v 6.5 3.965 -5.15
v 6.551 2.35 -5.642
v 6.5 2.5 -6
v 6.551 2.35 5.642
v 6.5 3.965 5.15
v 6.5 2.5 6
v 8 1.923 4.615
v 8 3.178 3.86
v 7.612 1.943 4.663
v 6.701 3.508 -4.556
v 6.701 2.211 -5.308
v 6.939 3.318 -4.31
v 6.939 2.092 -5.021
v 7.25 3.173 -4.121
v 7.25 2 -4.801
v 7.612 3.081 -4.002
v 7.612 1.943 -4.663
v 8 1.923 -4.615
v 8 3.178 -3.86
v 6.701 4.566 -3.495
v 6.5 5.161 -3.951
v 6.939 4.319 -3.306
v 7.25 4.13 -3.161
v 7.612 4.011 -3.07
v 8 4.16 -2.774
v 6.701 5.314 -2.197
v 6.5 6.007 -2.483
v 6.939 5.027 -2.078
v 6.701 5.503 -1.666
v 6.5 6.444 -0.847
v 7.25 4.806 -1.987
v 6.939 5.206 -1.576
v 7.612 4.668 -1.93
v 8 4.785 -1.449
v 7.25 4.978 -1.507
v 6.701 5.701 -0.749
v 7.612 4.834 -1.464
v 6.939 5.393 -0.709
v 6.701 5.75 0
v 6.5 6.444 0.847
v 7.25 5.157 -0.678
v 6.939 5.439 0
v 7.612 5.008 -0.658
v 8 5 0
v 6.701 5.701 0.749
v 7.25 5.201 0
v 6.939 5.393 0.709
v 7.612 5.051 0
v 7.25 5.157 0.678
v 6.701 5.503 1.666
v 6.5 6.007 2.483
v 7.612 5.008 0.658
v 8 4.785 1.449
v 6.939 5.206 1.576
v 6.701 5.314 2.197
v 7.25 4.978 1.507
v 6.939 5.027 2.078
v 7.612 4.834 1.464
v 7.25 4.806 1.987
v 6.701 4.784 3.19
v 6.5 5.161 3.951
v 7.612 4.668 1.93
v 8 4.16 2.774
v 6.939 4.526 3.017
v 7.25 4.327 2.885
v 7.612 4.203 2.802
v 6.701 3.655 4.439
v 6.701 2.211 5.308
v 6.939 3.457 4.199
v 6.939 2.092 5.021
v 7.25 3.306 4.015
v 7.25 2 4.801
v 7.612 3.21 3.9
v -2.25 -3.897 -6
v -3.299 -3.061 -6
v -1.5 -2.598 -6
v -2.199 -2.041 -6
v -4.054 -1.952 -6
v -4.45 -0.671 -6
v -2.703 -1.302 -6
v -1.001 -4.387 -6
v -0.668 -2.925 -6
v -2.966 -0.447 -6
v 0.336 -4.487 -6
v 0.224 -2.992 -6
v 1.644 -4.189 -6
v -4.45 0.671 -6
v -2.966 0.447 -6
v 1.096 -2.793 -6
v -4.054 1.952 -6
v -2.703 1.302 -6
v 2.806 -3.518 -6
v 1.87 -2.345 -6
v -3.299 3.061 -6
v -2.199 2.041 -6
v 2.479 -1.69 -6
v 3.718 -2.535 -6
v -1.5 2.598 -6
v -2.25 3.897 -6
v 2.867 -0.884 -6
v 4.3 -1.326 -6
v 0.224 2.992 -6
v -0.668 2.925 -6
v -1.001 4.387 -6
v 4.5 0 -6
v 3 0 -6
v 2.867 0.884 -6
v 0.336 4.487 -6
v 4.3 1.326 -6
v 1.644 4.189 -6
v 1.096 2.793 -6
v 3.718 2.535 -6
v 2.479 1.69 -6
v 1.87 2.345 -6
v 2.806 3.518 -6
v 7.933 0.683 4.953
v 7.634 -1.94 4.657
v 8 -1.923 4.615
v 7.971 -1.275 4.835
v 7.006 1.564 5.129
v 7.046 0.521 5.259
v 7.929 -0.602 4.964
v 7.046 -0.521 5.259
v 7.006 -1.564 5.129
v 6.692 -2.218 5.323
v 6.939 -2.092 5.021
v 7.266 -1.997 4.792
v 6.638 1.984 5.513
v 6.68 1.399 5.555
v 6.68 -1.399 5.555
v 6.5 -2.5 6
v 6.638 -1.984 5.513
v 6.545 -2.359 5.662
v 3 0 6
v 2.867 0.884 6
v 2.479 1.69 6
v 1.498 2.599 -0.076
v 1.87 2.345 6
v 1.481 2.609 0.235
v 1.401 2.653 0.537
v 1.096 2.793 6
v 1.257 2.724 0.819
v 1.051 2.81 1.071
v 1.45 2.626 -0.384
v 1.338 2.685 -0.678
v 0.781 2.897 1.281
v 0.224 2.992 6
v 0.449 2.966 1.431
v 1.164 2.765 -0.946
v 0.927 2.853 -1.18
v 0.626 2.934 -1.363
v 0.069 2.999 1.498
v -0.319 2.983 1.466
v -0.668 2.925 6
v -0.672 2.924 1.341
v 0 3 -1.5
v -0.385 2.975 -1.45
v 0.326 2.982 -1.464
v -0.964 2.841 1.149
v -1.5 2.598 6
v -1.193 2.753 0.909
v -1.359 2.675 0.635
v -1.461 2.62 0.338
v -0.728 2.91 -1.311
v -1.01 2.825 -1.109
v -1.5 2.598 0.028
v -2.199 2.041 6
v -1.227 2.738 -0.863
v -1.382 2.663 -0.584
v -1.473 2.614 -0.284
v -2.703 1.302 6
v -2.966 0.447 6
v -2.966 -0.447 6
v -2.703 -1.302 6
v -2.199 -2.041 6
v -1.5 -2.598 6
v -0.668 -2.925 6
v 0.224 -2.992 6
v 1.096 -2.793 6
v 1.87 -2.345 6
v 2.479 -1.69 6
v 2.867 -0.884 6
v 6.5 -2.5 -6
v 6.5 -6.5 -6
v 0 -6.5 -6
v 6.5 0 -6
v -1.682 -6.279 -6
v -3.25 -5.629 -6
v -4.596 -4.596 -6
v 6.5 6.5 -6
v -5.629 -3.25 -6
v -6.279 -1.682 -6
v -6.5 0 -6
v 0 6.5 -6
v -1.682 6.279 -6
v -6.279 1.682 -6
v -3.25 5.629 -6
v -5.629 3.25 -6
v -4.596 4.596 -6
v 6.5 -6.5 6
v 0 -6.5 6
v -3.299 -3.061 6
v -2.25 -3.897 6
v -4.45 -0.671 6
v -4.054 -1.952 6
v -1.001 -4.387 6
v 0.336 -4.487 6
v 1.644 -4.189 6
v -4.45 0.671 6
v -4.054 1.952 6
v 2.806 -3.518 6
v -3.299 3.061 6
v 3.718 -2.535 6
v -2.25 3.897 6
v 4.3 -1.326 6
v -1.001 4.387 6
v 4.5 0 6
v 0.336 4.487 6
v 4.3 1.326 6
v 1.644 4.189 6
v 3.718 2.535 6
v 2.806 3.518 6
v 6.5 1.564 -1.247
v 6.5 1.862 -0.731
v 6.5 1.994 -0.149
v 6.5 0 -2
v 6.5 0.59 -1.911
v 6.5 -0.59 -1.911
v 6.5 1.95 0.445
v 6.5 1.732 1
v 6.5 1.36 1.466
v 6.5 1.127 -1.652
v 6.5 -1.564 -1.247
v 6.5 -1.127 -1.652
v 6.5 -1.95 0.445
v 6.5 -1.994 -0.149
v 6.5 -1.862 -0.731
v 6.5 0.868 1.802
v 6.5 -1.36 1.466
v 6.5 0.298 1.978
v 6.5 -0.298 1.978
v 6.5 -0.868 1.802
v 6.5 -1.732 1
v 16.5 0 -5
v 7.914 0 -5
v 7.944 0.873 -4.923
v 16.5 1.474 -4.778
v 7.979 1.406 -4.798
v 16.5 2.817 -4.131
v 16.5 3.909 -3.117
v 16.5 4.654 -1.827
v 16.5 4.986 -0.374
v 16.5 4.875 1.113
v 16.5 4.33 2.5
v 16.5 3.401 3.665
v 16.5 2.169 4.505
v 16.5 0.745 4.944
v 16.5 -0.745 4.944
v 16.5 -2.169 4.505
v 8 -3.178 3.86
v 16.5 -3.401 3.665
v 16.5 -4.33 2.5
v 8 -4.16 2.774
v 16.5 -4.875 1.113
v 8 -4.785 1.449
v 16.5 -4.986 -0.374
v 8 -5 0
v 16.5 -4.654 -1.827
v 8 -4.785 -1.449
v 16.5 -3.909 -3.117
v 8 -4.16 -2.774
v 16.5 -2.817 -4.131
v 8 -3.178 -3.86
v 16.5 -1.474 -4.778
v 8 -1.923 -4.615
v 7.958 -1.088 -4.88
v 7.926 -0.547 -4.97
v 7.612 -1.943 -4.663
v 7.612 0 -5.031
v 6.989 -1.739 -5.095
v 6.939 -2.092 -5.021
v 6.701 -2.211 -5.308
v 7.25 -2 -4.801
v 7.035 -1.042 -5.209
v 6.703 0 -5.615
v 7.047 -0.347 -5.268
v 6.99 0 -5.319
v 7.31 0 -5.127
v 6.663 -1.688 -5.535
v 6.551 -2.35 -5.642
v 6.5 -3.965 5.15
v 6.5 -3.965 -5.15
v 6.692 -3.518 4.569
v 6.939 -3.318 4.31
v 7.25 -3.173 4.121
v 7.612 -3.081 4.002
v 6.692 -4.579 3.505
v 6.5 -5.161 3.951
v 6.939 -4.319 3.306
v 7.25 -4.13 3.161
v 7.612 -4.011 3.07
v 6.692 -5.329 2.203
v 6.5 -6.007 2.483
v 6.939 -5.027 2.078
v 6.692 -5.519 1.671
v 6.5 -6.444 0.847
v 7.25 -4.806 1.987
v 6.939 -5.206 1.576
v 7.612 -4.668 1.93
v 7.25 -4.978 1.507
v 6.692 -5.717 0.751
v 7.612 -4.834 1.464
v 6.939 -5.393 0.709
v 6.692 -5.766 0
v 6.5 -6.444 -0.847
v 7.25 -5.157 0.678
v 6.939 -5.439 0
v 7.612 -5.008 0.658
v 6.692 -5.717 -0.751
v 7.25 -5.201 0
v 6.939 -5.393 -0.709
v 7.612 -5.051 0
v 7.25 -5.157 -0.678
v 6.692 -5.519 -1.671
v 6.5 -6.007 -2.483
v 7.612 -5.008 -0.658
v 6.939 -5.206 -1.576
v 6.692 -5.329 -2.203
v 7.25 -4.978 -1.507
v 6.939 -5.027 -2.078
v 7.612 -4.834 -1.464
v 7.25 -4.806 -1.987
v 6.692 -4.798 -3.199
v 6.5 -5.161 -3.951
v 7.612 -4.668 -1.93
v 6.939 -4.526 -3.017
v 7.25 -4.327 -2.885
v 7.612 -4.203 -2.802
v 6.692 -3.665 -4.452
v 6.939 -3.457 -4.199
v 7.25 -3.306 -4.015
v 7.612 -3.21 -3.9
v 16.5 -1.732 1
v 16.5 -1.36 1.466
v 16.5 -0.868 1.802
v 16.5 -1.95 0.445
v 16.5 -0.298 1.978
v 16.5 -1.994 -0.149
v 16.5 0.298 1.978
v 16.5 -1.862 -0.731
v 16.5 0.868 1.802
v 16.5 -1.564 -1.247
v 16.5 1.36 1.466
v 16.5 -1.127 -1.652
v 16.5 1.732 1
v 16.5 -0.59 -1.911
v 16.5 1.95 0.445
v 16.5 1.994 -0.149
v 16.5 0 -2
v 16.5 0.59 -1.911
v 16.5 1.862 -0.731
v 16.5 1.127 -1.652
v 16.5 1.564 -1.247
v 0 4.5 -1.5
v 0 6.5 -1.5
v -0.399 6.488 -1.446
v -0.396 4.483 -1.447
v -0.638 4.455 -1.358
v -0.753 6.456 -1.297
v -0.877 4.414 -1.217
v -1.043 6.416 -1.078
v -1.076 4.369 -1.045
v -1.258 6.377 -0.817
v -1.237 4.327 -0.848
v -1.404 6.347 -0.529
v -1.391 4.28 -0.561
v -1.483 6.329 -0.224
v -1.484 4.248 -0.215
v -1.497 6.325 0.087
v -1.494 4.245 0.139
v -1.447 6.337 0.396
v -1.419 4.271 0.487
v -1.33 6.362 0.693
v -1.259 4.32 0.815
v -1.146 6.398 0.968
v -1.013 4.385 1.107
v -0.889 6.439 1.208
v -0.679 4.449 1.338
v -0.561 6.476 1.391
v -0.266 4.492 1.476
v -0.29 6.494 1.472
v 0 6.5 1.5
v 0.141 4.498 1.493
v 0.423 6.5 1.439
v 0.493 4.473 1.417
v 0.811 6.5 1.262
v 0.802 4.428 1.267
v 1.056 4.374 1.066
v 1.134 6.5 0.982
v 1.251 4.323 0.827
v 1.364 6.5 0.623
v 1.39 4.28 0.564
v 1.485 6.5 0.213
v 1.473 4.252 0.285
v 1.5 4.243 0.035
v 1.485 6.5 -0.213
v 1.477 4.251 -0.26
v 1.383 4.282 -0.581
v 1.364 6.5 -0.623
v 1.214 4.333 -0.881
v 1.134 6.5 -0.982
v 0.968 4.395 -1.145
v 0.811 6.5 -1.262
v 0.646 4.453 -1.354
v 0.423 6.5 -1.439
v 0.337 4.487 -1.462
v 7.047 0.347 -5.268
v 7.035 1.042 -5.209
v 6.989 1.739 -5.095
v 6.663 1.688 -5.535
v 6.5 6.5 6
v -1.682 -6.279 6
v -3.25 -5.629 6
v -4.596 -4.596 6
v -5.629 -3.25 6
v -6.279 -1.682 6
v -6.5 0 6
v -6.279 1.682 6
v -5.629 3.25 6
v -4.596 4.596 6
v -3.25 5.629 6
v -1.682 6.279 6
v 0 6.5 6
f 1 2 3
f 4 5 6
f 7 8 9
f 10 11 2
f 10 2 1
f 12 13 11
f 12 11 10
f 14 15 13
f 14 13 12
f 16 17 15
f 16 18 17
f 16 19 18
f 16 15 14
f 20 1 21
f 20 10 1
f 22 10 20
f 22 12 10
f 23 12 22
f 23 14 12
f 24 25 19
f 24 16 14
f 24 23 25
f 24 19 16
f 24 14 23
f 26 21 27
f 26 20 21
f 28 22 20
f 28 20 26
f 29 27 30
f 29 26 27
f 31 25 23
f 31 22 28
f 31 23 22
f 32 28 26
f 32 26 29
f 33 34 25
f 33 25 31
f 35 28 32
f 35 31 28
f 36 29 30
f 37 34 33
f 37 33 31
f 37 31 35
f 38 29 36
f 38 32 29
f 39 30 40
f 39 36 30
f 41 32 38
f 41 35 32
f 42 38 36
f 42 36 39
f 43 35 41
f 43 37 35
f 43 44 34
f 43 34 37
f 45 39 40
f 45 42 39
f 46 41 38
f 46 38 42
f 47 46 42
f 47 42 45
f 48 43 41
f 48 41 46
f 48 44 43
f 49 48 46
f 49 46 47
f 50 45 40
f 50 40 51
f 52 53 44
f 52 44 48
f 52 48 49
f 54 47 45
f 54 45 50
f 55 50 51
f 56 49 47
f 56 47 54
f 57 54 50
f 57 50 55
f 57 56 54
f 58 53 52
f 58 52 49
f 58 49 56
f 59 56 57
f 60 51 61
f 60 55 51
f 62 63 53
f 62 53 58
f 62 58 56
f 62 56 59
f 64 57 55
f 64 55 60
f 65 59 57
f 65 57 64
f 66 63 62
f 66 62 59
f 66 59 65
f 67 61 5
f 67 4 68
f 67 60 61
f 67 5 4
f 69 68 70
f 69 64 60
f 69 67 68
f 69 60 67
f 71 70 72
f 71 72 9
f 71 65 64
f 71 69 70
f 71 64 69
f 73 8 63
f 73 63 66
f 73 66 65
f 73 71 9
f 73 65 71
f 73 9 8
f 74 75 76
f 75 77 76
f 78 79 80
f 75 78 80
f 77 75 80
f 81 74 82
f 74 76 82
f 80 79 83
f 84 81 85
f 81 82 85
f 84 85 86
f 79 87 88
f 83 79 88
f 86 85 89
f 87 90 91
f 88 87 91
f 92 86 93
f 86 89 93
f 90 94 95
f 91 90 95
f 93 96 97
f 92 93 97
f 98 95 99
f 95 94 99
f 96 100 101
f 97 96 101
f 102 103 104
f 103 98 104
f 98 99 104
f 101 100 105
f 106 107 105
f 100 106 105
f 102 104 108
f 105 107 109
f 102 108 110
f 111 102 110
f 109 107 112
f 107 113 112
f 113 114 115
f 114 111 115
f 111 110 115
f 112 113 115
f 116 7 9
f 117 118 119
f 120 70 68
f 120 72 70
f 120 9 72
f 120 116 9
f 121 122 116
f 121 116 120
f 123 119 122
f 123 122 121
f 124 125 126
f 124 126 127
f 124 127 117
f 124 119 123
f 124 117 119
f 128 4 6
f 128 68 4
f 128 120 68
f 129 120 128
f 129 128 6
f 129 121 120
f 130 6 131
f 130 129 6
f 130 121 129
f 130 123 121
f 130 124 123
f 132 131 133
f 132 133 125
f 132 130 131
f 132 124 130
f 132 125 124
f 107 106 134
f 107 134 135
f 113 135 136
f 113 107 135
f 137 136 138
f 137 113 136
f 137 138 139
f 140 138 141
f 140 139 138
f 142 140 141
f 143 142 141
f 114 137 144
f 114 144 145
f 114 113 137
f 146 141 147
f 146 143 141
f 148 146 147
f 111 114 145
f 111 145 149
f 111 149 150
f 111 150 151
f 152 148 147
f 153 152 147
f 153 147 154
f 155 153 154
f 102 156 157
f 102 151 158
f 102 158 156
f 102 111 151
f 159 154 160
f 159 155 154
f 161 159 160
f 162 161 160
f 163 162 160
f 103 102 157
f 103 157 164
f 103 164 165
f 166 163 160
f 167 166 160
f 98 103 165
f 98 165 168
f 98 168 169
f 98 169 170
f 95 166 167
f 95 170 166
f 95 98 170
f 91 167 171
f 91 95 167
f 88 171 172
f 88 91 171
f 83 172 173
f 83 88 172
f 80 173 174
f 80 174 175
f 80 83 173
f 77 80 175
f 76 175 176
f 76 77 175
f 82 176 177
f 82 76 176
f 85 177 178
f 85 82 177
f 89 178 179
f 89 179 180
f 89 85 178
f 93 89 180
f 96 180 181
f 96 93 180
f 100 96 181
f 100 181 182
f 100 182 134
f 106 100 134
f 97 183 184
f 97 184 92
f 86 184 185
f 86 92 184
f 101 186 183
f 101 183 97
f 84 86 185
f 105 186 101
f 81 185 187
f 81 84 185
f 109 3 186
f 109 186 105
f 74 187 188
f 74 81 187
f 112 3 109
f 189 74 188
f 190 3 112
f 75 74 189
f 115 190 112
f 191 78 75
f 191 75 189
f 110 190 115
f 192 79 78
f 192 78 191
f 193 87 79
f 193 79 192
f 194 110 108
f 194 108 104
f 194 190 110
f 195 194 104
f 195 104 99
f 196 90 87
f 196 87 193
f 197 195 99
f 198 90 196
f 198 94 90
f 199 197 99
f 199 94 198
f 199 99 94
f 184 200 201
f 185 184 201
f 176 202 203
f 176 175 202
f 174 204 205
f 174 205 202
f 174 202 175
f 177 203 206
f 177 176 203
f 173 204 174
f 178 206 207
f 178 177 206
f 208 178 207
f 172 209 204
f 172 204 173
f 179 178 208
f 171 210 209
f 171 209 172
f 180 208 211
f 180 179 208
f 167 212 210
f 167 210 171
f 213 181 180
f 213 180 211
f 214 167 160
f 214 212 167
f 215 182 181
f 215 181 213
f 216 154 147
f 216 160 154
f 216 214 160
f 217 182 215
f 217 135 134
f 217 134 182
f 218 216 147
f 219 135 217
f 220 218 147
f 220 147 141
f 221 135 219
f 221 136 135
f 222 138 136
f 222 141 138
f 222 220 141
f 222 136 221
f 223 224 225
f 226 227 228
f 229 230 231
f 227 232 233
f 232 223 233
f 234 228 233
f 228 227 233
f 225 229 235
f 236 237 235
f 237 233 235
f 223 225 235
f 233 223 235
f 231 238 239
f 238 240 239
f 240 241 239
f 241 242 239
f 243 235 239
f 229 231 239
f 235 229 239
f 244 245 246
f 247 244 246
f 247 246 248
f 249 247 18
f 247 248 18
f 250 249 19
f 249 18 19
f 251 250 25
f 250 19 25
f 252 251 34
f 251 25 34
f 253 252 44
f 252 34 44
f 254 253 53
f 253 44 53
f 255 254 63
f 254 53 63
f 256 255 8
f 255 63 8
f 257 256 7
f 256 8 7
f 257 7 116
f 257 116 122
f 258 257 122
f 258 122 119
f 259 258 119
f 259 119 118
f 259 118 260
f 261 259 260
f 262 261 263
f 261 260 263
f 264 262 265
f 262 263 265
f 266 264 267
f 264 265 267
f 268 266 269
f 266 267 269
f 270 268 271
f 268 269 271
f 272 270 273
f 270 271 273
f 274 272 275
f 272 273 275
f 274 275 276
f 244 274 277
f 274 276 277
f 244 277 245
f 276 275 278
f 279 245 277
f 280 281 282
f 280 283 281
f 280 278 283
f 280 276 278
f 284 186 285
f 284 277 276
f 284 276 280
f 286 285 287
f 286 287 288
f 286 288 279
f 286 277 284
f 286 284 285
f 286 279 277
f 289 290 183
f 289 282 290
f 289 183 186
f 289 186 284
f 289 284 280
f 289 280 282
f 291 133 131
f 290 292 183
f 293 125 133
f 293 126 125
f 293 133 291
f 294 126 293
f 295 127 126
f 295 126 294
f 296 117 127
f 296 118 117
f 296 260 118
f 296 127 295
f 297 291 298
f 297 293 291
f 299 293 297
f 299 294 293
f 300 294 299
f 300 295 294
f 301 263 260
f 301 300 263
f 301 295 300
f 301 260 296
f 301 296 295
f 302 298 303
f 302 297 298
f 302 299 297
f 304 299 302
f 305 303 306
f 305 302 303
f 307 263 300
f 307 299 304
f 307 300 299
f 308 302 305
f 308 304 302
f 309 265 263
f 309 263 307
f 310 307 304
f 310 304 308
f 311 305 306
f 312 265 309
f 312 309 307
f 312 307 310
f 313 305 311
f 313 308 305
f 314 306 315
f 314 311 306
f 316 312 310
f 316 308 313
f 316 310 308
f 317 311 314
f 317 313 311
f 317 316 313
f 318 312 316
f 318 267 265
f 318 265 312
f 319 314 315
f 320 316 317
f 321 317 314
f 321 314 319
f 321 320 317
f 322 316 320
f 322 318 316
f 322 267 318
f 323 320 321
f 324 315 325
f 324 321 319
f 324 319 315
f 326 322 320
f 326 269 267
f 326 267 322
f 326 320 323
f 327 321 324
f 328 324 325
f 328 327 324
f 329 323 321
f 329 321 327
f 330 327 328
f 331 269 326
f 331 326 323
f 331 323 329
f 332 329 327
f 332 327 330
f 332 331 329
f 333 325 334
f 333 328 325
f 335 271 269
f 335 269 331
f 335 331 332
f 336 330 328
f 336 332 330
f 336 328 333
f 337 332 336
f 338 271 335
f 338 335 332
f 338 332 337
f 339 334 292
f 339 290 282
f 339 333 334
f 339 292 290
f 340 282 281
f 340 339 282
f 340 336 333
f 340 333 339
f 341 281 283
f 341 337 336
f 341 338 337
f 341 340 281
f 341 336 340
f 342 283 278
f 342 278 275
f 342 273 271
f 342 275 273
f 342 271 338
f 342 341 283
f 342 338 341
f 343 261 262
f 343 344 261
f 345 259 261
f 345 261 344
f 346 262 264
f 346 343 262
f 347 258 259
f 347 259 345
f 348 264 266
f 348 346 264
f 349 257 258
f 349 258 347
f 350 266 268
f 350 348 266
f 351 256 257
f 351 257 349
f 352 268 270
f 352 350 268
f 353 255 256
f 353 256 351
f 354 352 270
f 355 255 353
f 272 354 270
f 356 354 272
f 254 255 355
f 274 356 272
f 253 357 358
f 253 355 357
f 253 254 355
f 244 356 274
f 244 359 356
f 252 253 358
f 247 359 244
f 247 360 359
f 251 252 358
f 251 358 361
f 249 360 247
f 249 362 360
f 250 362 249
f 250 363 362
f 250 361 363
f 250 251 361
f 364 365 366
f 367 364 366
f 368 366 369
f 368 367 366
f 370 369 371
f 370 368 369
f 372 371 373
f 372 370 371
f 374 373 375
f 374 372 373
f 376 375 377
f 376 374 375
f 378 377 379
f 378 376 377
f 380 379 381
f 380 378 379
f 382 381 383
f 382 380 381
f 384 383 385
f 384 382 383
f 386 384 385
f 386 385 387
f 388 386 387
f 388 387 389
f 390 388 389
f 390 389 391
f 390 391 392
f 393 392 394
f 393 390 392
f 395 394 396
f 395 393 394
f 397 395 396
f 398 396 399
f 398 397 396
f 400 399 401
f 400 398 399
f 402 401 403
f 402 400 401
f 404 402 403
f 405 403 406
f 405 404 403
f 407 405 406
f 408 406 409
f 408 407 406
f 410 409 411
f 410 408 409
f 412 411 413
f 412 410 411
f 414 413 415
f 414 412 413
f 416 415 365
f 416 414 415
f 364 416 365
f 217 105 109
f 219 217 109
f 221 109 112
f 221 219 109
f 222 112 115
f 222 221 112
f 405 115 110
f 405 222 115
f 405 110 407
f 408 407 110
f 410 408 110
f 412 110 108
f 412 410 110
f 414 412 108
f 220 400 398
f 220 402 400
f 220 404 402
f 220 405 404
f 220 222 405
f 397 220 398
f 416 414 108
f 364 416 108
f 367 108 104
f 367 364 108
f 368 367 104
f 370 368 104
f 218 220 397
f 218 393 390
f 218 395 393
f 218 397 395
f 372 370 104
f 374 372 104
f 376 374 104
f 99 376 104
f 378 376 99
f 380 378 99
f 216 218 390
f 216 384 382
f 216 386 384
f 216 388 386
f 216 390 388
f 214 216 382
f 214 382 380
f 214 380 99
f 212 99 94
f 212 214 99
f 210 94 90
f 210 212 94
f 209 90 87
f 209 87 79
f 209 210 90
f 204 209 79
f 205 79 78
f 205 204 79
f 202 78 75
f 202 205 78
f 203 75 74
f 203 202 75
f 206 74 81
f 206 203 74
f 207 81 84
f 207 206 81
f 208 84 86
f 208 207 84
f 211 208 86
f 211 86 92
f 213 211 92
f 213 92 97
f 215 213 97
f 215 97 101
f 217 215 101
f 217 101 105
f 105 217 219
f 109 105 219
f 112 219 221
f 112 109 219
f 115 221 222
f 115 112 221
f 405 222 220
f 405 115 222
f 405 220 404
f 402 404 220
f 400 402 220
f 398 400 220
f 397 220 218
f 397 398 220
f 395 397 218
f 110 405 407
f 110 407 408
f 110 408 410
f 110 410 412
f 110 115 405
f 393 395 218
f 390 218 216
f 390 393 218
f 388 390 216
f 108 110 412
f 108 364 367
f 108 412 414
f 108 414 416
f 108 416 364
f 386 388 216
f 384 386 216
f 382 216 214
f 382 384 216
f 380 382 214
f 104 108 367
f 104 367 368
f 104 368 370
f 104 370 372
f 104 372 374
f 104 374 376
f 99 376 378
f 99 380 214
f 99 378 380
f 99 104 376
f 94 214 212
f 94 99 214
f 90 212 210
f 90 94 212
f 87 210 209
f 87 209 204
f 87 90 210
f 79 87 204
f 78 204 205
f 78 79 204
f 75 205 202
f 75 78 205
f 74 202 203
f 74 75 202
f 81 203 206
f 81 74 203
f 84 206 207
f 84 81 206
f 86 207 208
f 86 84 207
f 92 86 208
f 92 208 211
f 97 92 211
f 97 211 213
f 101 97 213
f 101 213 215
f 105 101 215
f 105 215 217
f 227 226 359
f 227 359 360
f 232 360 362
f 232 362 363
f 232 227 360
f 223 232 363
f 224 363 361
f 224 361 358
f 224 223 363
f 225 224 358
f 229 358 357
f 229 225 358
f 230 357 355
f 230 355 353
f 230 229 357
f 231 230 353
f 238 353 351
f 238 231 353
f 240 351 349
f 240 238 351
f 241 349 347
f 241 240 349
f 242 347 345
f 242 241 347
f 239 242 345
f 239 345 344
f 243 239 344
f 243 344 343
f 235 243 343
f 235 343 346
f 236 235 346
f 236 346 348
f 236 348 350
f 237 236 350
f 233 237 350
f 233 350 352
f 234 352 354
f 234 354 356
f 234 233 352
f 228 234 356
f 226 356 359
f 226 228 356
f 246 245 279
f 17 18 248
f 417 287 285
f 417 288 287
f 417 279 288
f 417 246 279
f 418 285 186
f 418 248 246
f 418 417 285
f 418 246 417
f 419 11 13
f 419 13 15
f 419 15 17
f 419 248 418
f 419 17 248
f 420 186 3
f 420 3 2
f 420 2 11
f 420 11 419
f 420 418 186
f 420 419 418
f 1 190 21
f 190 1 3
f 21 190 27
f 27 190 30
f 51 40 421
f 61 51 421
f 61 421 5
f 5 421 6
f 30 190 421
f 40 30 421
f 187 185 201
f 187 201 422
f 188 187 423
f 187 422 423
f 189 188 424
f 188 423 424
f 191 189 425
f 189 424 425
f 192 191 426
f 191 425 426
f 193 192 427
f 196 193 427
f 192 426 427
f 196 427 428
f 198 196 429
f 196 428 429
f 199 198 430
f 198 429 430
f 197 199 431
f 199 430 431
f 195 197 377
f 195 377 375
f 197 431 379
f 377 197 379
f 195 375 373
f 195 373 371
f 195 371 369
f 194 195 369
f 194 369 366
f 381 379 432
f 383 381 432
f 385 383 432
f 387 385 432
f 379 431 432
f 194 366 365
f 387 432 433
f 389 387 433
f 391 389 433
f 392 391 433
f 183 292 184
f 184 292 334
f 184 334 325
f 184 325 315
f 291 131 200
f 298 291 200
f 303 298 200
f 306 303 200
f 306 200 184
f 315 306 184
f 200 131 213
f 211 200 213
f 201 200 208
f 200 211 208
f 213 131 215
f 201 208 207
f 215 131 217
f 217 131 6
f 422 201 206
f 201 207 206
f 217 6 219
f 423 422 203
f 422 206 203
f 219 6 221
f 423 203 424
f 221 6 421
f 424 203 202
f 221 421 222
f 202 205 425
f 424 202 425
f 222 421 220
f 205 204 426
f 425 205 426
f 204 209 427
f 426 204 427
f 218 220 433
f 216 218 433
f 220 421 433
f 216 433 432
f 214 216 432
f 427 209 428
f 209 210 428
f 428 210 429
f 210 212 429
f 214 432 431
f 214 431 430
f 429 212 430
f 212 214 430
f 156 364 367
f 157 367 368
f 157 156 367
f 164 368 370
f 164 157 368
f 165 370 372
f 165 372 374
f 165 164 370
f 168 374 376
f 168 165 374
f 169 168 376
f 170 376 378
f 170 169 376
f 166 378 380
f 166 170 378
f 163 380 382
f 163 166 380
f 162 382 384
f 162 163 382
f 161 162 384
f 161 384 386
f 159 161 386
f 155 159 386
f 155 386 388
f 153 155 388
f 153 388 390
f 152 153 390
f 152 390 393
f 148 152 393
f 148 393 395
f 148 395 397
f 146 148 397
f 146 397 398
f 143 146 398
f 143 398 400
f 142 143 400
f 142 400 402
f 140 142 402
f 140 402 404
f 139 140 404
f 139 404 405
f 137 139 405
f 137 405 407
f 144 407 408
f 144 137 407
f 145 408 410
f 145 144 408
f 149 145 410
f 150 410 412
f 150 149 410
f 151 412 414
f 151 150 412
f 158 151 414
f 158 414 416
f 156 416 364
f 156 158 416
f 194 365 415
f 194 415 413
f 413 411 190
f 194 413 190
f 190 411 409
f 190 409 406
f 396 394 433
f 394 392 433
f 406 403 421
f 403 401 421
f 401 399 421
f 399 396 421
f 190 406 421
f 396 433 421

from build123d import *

# Parameters (mm, degrees)
SKETCH1_R           = 4.5
BOSS_EXTRUDE1_DEPTH = 6
SKETCH2_R           = 5
SKETCH2_R_2         = 2
BOSS_EXTRUDE2_DEPTH = 10
FILLET1_R           = 1.5
SKETCH1_3_R         = 4.5
SKETCH1_3_R_2       = 3
BOSS_EXTRUDE3_DEPTH = 6
SKETCH3_R           = 1.5
CUT_EXTRUDE1_DEPTH  = 19.721645382


with BuildPart() as part:
    # Sketch1 → Boss-Extrude1 (new, symmetric)
    with BuildSketch(Plane.XY):
        with BuildLine():
            ThreePointArc((0, -6.5), (-6.5, 0), (0, 6.5))
            Line((0, 6.5), (6.5, 6.5))
            Line((6.5, 6.5), (6.5, -6.5))
            Line((6.5, -6.5), (0, -6.5))
        make_face()
        Circle(SKETCH1_R, mode=Mode.SUBTRACT)
    extrude(amount=BOSS_EXTRUDE1_DEPTH, both=True)

    # Sketch2 → Boss-Extrude2 (add)
    with BuildSketch(Plane(origin=(6.5, 0, 0), x_dir=(0, 0, -1), z_dir=(1, 0, 0))):
        Circle(SKETCH2_R)
        Circle(SKETCH2_R_2, mode=Mode.SUBTRACT)
    extrude(amount=BOSS_EXTRUDE2_DEPTH)

    # Fillet1
    fillet1_edges = [part.edges().sort_by_distance(p)[0] for p in [
        (6.5, 0, 5),
    ]]
    fillet(fillet1_edges, radius=FILLET1_R - 0.0001)  # a hair under: the kernel refuses the full size


with BuildPart() as body_2:
    # Sketch1<3> → Boss-Extrude3 (new, symmetric)
    with BuildSketch(Plane.XY):
        Circle(SKETCH1_3_R)
        Circle(SKETCH1_3_R_2, mode=Mode.SUBTRACT)
    extrude(amount=BOSS_EXTRUDE3_DEPTH, both=True)


with BuildPart() as cut_extrude1_tool:
    # Sketch3 → Cut-Extrude1 (new, through all)
    with BuildSketch(Plane(origin=(0, 0, 0), x_dir=(1, 0, 0), z_dir=(0, 1, 0))):
        with Locations(Location((0, 0, 0), (0, 0, 90))):
            Circle(SKETCH3_R)
    extrude(amount=CUT_EXTRUDE1_DEPTH)


with BuildPart() as part_1:
    add(part.part)

    # Cut-Extrude1: cut by cut_extrude1_tool
    add(cut_extrude1_tool.part, mode=Mode.SUBTRACT)


with BuildPart() as body_2_1:
    add(body_2.part)

    # Cut-Extrude1: cut by cut_extrude1_tool
    add(cut_extrude1_tool.part, mode=Mode.SUBTRACT)


solid = Compound([part_1.part, body_2_1.part])
